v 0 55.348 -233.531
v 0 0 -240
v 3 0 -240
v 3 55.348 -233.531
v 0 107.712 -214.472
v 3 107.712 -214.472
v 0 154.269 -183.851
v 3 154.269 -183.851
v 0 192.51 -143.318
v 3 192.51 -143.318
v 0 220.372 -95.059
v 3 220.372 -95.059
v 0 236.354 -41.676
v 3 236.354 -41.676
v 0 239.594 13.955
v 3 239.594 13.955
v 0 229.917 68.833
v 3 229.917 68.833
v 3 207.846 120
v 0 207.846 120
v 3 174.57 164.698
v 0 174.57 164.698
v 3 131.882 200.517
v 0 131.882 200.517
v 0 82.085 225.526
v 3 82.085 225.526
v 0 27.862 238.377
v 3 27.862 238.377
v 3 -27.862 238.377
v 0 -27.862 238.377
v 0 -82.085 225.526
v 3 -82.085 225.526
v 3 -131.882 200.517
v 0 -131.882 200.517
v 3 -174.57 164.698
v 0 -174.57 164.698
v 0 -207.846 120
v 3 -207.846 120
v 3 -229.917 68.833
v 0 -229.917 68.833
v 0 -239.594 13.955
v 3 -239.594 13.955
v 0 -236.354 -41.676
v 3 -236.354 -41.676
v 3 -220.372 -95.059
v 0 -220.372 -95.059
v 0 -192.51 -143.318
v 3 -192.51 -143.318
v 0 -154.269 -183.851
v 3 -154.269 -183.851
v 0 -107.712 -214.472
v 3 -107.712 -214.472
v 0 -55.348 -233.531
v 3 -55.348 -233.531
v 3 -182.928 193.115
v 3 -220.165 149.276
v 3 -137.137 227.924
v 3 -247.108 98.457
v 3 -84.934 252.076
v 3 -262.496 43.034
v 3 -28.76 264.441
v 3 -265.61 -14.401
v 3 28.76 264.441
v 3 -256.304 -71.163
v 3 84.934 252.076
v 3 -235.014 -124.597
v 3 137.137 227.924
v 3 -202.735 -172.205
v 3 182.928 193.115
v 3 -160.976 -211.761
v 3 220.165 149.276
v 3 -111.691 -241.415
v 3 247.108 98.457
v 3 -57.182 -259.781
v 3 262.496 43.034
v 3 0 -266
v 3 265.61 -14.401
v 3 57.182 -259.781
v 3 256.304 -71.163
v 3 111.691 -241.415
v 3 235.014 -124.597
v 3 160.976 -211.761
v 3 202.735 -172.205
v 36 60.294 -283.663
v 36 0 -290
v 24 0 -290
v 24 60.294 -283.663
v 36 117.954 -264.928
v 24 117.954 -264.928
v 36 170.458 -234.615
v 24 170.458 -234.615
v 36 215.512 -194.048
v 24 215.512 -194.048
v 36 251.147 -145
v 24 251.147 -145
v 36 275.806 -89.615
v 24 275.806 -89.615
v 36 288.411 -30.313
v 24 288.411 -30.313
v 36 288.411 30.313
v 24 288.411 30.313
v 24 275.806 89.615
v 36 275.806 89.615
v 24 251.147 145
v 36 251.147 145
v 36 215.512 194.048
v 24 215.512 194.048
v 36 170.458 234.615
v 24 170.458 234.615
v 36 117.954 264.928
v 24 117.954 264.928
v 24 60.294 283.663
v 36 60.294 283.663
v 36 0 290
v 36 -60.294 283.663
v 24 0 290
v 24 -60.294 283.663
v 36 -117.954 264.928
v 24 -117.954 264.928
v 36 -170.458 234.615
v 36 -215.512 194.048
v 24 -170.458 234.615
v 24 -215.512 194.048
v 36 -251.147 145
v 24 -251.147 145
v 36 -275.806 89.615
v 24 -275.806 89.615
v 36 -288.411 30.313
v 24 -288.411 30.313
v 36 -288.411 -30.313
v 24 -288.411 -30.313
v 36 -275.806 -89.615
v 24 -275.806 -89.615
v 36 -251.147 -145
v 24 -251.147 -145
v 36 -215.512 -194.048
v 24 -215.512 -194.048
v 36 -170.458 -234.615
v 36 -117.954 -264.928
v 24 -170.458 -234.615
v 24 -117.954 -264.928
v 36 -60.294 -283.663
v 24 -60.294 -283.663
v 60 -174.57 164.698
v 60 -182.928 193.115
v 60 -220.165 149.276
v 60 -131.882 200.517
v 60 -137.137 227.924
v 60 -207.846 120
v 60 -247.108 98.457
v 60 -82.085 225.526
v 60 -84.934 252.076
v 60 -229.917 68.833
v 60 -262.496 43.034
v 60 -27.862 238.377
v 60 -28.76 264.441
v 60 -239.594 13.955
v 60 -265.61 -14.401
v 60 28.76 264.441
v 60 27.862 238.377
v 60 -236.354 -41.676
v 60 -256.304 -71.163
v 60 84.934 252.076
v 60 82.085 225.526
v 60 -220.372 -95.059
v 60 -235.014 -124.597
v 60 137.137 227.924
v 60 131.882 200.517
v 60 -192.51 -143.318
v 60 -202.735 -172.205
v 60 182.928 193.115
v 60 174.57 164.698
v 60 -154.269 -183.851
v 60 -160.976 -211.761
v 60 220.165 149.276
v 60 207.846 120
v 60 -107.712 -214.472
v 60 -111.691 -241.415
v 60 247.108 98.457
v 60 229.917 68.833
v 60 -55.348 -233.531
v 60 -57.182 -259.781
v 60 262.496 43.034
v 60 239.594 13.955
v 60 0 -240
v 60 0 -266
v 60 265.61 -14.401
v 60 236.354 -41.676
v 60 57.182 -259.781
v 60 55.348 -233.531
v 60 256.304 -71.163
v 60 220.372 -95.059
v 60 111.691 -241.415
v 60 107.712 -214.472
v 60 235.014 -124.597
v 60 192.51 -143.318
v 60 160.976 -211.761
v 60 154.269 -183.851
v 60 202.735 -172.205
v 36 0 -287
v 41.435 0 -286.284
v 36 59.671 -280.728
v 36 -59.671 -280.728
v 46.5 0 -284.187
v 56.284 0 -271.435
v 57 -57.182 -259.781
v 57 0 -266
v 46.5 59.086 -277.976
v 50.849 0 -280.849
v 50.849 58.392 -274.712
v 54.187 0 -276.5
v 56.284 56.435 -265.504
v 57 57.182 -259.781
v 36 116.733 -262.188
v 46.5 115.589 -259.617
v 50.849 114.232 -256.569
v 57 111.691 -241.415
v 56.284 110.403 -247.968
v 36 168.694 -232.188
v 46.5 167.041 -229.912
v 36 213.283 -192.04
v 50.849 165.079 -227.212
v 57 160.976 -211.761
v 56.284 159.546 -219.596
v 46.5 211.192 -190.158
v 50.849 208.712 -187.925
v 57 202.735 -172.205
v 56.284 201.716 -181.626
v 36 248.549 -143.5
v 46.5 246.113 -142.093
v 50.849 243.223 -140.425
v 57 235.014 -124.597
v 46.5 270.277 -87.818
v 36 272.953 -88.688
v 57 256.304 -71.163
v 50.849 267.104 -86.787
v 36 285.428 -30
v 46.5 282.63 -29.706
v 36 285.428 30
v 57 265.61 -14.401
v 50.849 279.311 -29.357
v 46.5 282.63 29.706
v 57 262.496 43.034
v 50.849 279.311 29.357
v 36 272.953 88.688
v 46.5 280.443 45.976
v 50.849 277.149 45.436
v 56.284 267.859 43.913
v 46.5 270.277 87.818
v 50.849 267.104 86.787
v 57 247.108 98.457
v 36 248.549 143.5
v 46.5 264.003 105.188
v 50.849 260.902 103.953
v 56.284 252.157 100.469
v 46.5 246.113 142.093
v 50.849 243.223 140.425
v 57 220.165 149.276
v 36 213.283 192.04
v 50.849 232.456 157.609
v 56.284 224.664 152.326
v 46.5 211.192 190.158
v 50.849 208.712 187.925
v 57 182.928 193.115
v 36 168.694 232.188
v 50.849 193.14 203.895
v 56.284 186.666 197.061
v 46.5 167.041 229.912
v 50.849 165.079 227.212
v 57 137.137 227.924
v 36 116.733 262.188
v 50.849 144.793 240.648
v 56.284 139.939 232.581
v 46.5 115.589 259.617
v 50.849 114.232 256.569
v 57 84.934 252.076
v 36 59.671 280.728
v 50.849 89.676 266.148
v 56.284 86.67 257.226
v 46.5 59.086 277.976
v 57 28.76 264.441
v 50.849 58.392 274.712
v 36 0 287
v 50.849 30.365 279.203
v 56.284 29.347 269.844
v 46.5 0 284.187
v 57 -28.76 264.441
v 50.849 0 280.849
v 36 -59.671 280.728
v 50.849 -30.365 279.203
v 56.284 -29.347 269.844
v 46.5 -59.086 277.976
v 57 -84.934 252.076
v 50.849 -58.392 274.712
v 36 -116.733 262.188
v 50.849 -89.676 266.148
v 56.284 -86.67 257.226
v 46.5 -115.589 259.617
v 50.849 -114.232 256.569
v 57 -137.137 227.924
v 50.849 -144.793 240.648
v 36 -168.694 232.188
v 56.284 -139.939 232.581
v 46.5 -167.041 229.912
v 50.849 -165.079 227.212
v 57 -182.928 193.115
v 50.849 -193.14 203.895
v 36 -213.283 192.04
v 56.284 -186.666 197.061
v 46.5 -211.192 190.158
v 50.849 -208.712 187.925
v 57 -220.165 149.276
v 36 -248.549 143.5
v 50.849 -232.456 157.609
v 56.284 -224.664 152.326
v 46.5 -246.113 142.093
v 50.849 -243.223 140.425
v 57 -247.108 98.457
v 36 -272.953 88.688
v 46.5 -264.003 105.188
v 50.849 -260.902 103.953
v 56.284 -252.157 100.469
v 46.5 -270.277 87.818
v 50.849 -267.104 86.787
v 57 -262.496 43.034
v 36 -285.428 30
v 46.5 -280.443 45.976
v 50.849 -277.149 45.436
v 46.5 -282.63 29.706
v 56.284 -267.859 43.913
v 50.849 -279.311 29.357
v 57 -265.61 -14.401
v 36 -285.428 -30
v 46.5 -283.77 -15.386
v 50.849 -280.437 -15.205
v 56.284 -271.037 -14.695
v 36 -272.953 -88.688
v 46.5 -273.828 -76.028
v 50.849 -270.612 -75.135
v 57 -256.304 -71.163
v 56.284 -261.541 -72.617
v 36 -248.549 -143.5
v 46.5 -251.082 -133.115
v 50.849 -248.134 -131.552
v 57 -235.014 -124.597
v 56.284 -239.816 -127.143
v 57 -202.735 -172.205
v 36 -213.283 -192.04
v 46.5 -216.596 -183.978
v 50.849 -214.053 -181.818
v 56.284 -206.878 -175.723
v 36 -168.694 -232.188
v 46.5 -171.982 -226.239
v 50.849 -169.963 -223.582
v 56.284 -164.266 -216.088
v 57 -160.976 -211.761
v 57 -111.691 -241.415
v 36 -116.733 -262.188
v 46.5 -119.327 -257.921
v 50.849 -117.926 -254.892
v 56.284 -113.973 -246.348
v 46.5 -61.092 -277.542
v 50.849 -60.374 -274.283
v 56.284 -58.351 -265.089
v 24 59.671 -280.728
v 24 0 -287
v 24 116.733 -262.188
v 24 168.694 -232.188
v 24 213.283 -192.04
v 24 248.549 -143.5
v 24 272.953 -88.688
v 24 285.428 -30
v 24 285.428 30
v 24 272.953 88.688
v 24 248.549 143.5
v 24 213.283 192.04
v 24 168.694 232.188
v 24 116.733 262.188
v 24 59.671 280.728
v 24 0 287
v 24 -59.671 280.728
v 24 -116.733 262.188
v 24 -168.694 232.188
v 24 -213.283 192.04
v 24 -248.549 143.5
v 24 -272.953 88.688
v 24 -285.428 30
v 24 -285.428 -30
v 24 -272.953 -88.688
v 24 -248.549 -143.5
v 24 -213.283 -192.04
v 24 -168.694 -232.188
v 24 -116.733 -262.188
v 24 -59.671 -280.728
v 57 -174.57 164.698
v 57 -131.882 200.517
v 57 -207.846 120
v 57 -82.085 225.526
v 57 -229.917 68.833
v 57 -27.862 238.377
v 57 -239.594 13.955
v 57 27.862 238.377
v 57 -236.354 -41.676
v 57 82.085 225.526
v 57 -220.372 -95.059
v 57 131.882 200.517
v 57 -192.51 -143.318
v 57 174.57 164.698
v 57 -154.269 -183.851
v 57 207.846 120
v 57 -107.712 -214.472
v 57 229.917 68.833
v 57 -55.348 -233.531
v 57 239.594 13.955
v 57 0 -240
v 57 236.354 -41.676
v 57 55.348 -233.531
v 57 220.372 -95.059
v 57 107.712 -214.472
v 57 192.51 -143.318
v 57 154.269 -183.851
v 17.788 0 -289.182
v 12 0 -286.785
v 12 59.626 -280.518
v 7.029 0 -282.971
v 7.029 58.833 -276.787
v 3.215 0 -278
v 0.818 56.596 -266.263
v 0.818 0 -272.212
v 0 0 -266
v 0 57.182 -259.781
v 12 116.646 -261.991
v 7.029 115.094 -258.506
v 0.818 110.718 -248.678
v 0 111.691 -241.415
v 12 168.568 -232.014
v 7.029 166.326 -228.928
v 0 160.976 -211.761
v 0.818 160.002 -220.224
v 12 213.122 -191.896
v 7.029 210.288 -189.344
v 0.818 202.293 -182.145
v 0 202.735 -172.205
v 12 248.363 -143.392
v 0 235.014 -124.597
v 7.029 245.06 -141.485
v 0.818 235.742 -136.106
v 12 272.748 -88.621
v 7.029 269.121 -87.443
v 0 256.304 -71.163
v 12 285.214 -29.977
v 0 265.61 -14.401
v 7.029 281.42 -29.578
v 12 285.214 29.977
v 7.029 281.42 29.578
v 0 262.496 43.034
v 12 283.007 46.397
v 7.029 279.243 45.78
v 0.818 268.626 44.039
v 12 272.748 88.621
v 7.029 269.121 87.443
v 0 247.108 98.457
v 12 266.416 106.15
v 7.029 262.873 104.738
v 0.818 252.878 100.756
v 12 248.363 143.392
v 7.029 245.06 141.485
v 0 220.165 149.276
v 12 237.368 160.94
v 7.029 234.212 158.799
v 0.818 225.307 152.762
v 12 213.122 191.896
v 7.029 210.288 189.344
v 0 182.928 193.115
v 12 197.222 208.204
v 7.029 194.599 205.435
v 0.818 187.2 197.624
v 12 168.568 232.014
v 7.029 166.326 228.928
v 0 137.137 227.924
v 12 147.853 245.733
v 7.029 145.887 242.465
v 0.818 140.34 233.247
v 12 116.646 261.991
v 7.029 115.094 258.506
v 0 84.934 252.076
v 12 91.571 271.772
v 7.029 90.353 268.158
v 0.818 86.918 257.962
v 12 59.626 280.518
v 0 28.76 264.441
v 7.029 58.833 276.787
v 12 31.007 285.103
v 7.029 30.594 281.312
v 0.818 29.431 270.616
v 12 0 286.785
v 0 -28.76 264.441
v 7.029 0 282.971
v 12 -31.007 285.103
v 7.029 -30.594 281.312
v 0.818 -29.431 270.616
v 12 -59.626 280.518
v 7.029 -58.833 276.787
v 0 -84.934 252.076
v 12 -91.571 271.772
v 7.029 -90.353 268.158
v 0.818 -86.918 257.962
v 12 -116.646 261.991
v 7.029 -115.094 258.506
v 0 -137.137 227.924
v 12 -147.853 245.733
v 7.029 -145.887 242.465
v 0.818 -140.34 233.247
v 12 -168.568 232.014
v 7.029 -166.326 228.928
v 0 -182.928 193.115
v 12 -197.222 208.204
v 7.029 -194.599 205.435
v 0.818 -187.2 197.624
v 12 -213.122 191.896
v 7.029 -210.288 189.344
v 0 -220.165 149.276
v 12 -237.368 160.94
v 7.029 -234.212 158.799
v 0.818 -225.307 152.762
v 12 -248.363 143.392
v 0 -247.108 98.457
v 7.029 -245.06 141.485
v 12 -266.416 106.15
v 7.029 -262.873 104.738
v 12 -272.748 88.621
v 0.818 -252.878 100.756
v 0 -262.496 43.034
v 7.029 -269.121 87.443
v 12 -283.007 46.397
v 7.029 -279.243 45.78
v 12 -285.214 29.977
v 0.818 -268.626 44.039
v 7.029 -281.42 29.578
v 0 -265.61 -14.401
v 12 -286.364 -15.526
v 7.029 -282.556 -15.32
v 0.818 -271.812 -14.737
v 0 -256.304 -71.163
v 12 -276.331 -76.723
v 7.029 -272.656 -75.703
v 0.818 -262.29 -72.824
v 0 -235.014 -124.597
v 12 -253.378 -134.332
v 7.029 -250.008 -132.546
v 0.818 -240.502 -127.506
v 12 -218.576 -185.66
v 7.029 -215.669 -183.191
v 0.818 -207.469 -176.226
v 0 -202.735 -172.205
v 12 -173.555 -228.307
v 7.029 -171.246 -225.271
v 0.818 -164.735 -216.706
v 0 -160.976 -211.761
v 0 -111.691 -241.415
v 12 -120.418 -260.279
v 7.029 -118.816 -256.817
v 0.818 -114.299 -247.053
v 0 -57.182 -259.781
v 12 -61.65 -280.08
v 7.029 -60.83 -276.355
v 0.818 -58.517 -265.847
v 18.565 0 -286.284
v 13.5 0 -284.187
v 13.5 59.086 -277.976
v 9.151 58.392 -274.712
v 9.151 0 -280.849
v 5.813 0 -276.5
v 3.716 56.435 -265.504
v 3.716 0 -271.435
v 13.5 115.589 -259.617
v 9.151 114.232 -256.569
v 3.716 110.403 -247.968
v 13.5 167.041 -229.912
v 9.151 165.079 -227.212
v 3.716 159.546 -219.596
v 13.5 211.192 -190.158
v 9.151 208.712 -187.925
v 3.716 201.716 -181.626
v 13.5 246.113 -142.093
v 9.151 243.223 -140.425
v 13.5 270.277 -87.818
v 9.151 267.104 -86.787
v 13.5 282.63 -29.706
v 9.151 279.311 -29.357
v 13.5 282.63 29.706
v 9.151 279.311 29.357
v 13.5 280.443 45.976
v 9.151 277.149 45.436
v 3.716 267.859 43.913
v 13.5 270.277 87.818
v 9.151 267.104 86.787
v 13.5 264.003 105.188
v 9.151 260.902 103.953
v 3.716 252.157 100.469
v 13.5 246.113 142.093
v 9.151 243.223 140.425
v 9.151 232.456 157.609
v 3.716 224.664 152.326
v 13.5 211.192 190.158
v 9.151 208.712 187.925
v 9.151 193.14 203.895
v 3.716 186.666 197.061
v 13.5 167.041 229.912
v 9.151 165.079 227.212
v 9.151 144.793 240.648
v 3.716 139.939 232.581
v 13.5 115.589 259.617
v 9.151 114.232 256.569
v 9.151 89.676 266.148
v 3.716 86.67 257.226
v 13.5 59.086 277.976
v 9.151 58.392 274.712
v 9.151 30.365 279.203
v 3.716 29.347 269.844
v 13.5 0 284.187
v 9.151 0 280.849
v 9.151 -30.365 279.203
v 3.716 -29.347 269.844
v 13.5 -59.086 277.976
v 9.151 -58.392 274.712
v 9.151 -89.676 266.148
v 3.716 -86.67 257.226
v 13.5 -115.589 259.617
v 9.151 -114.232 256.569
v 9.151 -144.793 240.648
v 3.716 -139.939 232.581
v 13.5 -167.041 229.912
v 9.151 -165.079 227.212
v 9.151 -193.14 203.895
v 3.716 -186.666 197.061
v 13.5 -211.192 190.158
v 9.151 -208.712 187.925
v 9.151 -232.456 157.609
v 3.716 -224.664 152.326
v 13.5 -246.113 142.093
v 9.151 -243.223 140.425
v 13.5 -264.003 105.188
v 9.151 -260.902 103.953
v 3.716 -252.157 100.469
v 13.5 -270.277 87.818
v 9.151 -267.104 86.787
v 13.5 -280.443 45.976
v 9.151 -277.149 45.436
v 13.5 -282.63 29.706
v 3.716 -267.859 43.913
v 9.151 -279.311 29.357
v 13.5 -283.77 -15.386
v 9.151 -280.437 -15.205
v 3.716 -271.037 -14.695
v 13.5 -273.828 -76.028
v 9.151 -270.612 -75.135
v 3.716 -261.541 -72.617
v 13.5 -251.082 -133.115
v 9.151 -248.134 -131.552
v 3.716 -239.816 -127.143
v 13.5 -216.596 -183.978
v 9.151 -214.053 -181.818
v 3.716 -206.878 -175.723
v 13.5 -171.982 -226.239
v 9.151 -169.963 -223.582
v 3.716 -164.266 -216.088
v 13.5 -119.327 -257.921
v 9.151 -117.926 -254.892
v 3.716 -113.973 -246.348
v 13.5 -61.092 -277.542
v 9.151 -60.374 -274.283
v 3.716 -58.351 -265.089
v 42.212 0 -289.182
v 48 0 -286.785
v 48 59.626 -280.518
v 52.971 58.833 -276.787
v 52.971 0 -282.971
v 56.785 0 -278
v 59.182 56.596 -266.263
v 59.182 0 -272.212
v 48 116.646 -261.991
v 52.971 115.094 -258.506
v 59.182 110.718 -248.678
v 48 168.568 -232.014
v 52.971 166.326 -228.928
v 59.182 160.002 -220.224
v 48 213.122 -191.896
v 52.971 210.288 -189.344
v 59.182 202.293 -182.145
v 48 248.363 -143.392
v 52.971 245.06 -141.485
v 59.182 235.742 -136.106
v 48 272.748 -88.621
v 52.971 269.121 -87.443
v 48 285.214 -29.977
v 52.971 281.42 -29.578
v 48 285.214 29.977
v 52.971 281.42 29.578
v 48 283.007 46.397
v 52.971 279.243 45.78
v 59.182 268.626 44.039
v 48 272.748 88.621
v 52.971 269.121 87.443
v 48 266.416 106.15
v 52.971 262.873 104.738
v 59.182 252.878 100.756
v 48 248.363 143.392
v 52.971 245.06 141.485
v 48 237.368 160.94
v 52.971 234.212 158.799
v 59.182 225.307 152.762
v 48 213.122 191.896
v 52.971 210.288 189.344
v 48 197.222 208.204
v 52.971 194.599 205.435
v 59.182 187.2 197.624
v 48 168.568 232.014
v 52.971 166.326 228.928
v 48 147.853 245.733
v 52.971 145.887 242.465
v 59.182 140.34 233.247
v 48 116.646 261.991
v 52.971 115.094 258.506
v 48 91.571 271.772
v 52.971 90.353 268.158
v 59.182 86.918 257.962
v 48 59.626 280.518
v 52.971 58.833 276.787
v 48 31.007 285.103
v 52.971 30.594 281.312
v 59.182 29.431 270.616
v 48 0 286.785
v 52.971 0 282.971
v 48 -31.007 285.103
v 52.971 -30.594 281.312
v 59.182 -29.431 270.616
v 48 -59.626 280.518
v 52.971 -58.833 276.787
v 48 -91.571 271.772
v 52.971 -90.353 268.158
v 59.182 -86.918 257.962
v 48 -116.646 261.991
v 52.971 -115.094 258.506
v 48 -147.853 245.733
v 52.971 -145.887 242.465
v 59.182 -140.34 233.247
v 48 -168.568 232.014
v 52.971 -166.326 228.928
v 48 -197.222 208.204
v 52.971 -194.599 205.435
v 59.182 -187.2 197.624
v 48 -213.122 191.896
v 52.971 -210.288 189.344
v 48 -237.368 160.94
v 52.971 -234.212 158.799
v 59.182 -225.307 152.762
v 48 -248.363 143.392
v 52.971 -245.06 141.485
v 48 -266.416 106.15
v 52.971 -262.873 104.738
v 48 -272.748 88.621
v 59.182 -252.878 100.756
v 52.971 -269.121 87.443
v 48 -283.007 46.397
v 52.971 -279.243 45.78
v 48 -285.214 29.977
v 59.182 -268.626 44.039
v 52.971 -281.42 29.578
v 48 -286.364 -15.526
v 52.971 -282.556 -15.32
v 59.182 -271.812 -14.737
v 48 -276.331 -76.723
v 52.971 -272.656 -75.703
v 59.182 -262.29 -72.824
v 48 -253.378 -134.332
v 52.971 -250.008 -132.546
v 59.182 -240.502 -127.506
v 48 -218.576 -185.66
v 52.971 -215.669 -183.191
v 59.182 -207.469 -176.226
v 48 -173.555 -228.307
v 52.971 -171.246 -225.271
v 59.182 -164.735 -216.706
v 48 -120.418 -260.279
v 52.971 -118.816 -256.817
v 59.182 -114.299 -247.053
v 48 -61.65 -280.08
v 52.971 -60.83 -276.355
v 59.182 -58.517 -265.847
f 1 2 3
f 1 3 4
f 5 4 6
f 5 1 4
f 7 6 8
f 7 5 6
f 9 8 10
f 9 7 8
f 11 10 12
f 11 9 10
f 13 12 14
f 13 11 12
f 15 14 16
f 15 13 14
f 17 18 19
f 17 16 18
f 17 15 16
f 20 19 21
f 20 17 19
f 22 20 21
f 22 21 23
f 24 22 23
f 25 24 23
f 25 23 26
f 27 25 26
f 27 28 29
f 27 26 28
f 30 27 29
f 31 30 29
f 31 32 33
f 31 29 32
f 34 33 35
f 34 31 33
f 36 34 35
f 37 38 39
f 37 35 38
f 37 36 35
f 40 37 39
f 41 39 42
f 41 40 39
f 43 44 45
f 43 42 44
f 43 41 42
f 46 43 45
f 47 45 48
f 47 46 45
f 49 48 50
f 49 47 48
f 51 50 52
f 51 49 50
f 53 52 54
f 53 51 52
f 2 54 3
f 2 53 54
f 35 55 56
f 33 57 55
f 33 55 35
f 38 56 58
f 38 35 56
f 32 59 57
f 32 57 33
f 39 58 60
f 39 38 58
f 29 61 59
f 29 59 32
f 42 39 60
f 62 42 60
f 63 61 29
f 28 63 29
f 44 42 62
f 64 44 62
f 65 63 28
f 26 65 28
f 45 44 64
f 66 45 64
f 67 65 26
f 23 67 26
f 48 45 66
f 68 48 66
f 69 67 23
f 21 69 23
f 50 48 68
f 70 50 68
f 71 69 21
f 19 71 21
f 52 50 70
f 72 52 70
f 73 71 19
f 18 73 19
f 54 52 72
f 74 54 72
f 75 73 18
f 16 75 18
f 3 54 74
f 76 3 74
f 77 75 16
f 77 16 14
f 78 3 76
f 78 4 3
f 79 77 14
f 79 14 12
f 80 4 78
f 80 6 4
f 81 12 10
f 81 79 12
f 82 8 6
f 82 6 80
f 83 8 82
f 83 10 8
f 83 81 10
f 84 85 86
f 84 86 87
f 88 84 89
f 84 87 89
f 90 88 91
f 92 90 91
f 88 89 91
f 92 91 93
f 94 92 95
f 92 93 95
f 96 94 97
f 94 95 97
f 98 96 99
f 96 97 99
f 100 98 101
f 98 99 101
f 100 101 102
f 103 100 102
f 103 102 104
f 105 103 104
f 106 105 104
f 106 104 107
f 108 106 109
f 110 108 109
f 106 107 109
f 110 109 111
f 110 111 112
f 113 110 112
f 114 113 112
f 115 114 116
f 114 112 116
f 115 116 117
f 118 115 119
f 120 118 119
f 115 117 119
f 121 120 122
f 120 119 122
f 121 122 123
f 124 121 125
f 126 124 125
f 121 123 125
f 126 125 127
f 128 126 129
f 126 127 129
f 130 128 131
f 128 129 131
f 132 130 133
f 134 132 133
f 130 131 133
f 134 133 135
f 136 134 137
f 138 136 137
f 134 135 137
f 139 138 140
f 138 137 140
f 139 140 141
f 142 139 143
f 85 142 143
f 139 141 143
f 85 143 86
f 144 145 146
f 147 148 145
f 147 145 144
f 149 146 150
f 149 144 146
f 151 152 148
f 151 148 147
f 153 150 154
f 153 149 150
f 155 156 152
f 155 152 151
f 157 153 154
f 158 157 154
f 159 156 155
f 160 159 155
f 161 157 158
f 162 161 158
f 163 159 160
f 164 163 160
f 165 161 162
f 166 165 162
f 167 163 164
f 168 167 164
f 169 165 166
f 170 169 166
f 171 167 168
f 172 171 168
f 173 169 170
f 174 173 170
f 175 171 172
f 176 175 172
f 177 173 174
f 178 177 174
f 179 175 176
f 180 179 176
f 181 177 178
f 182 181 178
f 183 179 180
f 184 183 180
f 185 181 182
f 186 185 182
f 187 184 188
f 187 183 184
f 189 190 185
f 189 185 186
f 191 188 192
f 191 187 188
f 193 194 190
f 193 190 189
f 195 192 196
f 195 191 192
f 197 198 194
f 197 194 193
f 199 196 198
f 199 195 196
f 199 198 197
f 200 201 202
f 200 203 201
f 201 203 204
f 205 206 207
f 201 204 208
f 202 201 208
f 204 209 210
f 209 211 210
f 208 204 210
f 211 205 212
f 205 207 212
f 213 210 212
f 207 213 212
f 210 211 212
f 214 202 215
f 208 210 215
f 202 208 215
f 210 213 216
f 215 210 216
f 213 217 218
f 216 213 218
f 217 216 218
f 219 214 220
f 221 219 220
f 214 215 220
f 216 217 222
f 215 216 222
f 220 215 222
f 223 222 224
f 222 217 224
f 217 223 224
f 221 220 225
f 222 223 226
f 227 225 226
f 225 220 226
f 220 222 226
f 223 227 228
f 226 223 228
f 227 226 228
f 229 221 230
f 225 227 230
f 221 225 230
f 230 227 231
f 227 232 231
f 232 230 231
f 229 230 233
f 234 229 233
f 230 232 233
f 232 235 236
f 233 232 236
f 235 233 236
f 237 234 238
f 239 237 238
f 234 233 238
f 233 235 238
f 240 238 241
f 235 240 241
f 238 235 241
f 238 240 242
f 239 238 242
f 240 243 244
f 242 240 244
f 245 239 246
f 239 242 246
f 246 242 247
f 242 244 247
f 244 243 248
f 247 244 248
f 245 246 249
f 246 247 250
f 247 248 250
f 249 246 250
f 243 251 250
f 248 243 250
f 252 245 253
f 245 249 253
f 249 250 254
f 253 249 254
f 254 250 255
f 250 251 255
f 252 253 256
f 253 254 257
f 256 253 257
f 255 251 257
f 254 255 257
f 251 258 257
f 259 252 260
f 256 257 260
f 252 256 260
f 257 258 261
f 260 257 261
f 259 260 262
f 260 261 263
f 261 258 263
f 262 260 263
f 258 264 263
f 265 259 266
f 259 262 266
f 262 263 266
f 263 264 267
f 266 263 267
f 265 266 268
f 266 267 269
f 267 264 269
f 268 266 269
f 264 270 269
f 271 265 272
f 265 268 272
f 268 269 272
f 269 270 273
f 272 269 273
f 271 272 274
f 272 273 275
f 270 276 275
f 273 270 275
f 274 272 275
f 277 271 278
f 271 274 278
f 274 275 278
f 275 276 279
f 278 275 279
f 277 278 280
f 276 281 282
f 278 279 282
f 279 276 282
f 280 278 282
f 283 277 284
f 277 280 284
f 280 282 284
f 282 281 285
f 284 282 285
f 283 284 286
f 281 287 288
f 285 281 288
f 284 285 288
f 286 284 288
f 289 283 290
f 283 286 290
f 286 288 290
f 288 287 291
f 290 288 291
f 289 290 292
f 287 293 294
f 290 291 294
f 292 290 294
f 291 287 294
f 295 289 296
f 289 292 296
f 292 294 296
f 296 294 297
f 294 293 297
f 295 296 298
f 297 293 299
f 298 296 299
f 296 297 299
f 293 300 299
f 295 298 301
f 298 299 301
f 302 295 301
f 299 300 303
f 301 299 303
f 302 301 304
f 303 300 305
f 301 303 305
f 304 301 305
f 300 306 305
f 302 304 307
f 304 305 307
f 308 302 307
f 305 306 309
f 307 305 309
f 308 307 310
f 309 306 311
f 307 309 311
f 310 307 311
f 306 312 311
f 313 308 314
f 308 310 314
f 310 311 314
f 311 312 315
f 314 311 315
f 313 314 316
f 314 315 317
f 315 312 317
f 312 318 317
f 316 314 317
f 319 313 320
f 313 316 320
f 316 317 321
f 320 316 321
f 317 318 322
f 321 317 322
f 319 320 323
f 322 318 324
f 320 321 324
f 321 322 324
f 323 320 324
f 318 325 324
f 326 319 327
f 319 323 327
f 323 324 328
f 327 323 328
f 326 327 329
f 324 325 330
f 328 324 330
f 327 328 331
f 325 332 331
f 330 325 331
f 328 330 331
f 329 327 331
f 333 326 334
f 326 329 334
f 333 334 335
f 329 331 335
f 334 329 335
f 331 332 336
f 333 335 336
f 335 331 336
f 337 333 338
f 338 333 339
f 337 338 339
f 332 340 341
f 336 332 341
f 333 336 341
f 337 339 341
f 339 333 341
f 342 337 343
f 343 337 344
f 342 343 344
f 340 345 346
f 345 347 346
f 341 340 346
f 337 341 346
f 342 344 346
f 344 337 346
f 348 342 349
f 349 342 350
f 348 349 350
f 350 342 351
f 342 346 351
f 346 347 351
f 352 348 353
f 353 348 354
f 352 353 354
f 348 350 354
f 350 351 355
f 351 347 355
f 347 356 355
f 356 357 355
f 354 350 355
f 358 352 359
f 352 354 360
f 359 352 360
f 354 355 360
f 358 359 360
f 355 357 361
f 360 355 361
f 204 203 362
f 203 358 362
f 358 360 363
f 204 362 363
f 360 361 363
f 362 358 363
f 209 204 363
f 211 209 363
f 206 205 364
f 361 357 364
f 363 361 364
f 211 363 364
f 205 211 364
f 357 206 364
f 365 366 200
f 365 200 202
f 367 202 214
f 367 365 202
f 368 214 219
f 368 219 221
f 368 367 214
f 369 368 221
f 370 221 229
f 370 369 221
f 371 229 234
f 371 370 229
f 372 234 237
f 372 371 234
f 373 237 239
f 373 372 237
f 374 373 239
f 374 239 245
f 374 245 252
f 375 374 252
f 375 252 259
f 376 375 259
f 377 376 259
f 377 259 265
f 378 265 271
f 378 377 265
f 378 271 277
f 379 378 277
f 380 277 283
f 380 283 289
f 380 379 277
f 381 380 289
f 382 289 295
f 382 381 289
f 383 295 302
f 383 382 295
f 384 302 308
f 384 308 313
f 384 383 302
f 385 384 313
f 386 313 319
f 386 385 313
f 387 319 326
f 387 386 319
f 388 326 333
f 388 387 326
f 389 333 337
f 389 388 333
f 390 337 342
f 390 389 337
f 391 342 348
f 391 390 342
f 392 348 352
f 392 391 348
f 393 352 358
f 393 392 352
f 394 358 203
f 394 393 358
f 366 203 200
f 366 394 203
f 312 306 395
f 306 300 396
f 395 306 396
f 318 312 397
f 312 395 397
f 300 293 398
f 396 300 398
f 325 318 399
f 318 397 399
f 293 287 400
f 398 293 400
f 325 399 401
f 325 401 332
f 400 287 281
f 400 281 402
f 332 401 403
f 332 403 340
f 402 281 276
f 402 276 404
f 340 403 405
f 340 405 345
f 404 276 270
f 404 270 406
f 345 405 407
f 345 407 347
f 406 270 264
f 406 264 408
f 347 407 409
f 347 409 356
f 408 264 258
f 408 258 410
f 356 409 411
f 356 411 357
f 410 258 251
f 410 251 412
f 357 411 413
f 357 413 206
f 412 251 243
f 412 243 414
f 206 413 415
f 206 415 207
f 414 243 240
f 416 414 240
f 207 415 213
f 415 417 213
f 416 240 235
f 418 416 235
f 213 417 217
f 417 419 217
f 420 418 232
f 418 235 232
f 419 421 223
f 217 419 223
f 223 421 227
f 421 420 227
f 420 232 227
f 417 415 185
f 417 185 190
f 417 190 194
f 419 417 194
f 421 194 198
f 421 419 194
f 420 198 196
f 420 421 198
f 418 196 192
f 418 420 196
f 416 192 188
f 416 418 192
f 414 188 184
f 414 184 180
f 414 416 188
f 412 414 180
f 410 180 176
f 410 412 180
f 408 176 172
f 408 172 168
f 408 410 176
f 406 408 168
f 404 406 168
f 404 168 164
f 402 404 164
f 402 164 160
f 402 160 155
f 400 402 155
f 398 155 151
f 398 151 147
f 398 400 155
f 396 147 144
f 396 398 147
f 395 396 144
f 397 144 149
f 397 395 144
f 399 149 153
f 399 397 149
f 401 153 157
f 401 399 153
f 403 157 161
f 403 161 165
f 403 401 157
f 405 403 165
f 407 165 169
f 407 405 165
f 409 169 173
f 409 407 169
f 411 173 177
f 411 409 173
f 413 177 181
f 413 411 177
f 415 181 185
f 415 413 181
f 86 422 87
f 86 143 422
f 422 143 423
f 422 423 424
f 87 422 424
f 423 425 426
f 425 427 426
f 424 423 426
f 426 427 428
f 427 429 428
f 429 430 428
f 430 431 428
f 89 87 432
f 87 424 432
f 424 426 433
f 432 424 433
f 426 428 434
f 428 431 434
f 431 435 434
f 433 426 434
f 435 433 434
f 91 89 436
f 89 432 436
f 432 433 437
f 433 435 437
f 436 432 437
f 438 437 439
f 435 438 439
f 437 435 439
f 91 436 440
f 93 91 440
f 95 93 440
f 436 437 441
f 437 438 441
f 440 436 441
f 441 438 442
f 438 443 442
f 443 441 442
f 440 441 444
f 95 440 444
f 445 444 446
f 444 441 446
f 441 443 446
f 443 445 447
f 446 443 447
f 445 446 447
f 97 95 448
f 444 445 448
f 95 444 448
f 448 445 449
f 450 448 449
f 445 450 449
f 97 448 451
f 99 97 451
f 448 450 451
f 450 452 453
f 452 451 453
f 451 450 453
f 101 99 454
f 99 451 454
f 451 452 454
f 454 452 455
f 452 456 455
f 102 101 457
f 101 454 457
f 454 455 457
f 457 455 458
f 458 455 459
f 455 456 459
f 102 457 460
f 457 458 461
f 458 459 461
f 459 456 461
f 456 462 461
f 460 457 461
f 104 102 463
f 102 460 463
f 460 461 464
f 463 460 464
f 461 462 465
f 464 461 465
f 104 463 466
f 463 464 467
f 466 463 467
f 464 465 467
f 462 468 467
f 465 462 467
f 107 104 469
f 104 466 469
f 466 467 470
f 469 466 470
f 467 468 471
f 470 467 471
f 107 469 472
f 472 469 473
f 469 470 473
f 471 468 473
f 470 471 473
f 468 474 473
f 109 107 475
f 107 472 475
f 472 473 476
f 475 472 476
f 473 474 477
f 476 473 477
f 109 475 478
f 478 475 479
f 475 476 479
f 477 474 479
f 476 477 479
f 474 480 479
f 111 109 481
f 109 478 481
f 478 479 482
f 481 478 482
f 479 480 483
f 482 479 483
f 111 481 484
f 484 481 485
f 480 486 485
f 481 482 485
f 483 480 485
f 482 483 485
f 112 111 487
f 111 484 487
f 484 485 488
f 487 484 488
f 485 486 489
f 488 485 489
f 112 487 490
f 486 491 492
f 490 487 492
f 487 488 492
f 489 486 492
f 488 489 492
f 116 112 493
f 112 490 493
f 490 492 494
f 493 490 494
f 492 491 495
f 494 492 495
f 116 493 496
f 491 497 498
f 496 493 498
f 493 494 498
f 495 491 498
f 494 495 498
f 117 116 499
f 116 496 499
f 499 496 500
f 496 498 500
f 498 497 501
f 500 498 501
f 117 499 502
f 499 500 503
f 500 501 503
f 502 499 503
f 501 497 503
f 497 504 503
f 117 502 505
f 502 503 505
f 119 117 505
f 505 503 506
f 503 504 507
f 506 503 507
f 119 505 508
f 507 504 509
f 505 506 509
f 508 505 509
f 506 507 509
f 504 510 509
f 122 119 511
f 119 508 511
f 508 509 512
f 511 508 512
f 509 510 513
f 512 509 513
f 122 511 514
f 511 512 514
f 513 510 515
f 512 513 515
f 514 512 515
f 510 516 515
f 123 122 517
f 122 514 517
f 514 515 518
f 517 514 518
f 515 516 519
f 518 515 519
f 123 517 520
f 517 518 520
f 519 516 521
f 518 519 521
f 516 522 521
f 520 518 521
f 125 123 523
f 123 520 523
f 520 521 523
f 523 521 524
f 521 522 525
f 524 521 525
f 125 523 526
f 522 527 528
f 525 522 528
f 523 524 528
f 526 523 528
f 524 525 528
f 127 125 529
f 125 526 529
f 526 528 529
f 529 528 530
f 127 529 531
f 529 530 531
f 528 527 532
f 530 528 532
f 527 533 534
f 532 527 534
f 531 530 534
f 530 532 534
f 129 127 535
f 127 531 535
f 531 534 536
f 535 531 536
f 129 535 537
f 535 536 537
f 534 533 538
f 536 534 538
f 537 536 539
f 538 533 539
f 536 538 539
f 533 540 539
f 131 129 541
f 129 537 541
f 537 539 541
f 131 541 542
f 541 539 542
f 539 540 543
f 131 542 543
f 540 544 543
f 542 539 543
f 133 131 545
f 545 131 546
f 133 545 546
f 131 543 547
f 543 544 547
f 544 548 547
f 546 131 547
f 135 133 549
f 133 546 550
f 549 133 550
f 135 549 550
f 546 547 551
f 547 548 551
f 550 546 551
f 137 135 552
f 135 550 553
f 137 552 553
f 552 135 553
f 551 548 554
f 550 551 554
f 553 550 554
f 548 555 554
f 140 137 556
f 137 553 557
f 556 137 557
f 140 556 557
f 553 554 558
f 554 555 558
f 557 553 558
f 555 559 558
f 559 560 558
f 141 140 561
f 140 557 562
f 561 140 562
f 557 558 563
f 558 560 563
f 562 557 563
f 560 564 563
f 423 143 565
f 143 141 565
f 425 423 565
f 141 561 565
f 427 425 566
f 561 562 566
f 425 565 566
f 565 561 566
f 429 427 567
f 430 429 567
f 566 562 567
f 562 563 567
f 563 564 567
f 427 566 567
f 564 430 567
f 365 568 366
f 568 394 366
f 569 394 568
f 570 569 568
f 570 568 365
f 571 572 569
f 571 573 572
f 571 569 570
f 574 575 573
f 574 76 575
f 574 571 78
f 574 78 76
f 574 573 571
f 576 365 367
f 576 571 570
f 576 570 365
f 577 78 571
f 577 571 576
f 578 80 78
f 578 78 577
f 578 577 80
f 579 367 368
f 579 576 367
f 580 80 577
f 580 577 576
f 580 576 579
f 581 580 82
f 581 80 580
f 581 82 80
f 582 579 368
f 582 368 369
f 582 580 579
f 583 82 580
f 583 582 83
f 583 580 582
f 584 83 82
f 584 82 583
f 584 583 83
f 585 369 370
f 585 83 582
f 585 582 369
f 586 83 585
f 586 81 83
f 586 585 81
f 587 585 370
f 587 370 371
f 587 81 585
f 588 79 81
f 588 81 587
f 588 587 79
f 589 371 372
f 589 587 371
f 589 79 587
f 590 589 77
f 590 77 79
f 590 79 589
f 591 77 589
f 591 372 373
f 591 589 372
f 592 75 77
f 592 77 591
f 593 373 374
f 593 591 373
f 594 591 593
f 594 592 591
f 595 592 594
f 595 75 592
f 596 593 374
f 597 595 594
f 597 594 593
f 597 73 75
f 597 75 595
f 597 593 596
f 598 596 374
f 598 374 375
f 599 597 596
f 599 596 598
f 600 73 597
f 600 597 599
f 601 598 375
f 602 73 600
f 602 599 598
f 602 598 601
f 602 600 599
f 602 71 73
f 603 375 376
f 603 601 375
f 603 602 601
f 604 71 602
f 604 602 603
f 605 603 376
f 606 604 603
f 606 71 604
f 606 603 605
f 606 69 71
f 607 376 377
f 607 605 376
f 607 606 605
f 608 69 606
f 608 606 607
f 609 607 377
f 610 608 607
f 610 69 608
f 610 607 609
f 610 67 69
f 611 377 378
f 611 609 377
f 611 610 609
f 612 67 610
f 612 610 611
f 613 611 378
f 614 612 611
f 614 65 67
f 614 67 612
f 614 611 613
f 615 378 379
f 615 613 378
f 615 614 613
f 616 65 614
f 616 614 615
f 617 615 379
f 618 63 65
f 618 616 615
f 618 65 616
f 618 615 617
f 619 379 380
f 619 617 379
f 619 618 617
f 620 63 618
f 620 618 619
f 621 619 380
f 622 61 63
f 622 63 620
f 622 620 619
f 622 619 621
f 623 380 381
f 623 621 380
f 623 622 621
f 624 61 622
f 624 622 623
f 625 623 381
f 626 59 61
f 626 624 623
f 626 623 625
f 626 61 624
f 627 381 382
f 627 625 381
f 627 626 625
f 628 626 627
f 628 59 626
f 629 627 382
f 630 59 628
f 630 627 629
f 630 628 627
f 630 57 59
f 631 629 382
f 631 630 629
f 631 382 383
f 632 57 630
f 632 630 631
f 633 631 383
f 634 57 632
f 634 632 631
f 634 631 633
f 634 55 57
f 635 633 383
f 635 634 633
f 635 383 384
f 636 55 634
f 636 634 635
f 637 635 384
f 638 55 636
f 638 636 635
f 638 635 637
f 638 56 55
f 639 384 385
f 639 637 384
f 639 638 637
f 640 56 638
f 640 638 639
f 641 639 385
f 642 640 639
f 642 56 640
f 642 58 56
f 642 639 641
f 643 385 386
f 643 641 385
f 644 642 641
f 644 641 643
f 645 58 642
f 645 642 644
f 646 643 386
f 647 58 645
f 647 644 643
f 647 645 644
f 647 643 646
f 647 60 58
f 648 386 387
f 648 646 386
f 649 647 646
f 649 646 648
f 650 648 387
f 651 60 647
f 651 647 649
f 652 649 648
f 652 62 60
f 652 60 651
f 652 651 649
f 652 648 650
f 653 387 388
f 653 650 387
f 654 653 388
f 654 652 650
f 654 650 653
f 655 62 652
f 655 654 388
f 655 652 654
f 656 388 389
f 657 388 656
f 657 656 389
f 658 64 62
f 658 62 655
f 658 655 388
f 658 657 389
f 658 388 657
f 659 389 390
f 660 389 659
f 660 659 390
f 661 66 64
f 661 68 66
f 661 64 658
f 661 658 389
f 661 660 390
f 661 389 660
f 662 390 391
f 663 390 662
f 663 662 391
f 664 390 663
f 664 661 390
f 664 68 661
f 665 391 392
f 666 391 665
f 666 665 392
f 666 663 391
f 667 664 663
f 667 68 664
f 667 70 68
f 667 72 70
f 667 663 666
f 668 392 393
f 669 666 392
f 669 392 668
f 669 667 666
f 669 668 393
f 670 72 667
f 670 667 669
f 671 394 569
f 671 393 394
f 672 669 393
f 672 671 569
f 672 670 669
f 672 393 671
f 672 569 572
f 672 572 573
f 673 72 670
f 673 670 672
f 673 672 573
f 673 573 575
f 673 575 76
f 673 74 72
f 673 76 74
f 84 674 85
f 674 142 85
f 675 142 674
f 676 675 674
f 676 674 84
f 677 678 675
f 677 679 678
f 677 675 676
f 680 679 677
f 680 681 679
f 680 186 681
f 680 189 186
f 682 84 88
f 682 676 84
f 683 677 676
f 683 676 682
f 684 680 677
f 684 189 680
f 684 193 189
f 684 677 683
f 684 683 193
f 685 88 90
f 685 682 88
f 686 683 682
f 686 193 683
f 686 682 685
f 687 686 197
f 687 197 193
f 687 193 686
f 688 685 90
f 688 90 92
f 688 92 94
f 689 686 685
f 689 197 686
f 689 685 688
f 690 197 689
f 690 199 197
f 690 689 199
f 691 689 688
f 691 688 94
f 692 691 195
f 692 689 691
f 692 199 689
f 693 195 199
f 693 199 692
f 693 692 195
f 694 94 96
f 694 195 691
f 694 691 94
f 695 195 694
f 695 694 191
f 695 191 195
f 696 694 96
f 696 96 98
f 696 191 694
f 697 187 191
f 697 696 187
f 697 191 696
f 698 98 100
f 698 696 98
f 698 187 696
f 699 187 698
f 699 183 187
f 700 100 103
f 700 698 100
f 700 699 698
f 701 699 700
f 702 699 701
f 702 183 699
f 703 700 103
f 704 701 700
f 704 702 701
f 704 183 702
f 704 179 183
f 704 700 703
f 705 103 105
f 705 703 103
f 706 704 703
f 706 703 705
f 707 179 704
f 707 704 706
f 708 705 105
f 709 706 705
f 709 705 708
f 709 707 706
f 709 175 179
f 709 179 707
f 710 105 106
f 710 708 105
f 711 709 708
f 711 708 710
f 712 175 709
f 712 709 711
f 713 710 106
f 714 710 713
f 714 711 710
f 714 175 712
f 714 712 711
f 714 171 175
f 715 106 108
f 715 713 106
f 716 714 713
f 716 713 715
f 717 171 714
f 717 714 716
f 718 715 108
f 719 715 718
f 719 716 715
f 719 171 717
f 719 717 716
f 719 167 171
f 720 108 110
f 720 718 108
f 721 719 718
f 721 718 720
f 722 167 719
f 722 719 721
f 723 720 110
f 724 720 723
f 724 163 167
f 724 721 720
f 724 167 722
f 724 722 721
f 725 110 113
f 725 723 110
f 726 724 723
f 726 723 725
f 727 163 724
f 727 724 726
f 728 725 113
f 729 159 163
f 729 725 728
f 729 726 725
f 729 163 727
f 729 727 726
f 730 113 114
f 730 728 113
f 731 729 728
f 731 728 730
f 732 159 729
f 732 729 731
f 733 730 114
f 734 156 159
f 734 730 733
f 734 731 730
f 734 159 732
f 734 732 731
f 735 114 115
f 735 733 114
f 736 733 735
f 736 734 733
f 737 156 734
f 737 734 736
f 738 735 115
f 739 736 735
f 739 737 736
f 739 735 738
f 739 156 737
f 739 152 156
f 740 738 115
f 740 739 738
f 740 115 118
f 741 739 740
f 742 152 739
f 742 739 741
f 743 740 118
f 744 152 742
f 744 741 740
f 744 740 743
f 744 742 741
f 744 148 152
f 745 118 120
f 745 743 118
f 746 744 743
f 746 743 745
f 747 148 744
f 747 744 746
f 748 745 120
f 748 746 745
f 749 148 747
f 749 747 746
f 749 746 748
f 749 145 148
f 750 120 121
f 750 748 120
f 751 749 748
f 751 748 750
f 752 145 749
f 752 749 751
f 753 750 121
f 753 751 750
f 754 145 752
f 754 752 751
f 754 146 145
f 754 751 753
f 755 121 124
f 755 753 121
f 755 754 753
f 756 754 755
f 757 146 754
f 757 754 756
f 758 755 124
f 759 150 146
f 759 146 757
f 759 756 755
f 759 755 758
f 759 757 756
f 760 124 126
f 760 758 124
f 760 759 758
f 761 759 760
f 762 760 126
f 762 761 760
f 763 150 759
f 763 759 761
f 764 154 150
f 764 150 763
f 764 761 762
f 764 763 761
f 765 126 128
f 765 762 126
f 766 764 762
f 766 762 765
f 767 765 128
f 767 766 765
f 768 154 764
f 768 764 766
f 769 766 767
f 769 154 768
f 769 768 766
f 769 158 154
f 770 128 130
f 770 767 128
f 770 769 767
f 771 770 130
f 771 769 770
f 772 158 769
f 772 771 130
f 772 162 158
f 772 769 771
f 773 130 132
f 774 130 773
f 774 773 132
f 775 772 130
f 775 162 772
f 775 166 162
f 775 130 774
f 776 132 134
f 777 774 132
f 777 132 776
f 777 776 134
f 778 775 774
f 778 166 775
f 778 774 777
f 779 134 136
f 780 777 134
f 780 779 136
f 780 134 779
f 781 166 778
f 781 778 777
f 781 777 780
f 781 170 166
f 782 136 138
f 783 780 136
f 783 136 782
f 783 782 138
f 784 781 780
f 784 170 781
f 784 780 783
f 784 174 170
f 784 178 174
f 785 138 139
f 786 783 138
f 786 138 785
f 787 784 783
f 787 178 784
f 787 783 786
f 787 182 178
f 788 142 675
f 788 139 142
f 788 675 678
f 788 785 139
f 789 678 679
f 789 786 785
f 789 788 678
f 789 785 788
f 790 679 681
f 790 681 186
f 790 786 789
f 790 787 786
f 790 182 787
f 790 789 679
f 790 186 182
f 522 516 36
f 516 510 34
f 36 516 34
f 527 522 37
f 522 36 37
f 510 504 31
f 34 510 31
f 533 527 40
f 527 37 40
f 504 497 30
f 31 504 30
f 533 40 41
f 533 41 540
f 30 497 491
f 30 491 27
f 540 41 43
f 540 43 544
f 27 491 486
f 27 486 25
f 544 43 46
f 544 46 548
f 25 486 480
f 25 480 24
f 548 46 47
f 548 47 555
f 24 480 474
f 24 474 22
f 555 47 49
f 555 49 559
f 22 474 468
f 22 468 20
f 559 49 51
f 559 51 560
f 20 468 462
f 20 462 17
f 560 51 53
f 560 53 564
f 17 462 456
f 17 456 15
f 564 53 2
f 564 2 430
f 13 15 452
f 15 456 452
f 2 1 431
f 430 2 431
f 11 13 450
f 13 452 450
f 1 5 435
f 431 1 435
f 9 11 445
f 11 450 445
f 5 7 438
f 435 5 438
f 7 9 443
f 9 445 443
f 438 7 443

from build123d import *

# Parameters (mm, degrees)
SKETCH3_R           = 290
SKETCH3_R_2         = 240
BOSS_EXTRUDE1_DEPTH = 60
FILLET1_R           = 24
SHELL1_T            = -3


with BuildPart() as part:
    # Sketch3 → Boss-Extrude1 (new body)
    with BuildSketch(Plane(origin=(0, 0, 0), x_dir=(0, 0, -1), z_dir=(1, 0, 0))):
        Circle(SKETCH3_R)
        Circle(SKETCH3_R_2, mode=Mode.SUBTRACT)
    extrude(amount=BOSS_EXTRUDE1_DEPTH)

    # Fillet1
    fillet1_edges = [part.edges().sort_by_distance(p)[0] for p in [
        (0, 0, 290),
        (60, 0, 290),
    ]]
    fillet(fillet1_edges, radius=FILLET1_R)

    # Shell1
    shell1_openings = [part.faces().sort_by_distance(p)[0] for p in [
        (30, 0, 240),
    ]]
    offset(amount=SHELL1_T, openings=shell1_openings, kind=Kind.INTERSECTION)


solid = part.part
